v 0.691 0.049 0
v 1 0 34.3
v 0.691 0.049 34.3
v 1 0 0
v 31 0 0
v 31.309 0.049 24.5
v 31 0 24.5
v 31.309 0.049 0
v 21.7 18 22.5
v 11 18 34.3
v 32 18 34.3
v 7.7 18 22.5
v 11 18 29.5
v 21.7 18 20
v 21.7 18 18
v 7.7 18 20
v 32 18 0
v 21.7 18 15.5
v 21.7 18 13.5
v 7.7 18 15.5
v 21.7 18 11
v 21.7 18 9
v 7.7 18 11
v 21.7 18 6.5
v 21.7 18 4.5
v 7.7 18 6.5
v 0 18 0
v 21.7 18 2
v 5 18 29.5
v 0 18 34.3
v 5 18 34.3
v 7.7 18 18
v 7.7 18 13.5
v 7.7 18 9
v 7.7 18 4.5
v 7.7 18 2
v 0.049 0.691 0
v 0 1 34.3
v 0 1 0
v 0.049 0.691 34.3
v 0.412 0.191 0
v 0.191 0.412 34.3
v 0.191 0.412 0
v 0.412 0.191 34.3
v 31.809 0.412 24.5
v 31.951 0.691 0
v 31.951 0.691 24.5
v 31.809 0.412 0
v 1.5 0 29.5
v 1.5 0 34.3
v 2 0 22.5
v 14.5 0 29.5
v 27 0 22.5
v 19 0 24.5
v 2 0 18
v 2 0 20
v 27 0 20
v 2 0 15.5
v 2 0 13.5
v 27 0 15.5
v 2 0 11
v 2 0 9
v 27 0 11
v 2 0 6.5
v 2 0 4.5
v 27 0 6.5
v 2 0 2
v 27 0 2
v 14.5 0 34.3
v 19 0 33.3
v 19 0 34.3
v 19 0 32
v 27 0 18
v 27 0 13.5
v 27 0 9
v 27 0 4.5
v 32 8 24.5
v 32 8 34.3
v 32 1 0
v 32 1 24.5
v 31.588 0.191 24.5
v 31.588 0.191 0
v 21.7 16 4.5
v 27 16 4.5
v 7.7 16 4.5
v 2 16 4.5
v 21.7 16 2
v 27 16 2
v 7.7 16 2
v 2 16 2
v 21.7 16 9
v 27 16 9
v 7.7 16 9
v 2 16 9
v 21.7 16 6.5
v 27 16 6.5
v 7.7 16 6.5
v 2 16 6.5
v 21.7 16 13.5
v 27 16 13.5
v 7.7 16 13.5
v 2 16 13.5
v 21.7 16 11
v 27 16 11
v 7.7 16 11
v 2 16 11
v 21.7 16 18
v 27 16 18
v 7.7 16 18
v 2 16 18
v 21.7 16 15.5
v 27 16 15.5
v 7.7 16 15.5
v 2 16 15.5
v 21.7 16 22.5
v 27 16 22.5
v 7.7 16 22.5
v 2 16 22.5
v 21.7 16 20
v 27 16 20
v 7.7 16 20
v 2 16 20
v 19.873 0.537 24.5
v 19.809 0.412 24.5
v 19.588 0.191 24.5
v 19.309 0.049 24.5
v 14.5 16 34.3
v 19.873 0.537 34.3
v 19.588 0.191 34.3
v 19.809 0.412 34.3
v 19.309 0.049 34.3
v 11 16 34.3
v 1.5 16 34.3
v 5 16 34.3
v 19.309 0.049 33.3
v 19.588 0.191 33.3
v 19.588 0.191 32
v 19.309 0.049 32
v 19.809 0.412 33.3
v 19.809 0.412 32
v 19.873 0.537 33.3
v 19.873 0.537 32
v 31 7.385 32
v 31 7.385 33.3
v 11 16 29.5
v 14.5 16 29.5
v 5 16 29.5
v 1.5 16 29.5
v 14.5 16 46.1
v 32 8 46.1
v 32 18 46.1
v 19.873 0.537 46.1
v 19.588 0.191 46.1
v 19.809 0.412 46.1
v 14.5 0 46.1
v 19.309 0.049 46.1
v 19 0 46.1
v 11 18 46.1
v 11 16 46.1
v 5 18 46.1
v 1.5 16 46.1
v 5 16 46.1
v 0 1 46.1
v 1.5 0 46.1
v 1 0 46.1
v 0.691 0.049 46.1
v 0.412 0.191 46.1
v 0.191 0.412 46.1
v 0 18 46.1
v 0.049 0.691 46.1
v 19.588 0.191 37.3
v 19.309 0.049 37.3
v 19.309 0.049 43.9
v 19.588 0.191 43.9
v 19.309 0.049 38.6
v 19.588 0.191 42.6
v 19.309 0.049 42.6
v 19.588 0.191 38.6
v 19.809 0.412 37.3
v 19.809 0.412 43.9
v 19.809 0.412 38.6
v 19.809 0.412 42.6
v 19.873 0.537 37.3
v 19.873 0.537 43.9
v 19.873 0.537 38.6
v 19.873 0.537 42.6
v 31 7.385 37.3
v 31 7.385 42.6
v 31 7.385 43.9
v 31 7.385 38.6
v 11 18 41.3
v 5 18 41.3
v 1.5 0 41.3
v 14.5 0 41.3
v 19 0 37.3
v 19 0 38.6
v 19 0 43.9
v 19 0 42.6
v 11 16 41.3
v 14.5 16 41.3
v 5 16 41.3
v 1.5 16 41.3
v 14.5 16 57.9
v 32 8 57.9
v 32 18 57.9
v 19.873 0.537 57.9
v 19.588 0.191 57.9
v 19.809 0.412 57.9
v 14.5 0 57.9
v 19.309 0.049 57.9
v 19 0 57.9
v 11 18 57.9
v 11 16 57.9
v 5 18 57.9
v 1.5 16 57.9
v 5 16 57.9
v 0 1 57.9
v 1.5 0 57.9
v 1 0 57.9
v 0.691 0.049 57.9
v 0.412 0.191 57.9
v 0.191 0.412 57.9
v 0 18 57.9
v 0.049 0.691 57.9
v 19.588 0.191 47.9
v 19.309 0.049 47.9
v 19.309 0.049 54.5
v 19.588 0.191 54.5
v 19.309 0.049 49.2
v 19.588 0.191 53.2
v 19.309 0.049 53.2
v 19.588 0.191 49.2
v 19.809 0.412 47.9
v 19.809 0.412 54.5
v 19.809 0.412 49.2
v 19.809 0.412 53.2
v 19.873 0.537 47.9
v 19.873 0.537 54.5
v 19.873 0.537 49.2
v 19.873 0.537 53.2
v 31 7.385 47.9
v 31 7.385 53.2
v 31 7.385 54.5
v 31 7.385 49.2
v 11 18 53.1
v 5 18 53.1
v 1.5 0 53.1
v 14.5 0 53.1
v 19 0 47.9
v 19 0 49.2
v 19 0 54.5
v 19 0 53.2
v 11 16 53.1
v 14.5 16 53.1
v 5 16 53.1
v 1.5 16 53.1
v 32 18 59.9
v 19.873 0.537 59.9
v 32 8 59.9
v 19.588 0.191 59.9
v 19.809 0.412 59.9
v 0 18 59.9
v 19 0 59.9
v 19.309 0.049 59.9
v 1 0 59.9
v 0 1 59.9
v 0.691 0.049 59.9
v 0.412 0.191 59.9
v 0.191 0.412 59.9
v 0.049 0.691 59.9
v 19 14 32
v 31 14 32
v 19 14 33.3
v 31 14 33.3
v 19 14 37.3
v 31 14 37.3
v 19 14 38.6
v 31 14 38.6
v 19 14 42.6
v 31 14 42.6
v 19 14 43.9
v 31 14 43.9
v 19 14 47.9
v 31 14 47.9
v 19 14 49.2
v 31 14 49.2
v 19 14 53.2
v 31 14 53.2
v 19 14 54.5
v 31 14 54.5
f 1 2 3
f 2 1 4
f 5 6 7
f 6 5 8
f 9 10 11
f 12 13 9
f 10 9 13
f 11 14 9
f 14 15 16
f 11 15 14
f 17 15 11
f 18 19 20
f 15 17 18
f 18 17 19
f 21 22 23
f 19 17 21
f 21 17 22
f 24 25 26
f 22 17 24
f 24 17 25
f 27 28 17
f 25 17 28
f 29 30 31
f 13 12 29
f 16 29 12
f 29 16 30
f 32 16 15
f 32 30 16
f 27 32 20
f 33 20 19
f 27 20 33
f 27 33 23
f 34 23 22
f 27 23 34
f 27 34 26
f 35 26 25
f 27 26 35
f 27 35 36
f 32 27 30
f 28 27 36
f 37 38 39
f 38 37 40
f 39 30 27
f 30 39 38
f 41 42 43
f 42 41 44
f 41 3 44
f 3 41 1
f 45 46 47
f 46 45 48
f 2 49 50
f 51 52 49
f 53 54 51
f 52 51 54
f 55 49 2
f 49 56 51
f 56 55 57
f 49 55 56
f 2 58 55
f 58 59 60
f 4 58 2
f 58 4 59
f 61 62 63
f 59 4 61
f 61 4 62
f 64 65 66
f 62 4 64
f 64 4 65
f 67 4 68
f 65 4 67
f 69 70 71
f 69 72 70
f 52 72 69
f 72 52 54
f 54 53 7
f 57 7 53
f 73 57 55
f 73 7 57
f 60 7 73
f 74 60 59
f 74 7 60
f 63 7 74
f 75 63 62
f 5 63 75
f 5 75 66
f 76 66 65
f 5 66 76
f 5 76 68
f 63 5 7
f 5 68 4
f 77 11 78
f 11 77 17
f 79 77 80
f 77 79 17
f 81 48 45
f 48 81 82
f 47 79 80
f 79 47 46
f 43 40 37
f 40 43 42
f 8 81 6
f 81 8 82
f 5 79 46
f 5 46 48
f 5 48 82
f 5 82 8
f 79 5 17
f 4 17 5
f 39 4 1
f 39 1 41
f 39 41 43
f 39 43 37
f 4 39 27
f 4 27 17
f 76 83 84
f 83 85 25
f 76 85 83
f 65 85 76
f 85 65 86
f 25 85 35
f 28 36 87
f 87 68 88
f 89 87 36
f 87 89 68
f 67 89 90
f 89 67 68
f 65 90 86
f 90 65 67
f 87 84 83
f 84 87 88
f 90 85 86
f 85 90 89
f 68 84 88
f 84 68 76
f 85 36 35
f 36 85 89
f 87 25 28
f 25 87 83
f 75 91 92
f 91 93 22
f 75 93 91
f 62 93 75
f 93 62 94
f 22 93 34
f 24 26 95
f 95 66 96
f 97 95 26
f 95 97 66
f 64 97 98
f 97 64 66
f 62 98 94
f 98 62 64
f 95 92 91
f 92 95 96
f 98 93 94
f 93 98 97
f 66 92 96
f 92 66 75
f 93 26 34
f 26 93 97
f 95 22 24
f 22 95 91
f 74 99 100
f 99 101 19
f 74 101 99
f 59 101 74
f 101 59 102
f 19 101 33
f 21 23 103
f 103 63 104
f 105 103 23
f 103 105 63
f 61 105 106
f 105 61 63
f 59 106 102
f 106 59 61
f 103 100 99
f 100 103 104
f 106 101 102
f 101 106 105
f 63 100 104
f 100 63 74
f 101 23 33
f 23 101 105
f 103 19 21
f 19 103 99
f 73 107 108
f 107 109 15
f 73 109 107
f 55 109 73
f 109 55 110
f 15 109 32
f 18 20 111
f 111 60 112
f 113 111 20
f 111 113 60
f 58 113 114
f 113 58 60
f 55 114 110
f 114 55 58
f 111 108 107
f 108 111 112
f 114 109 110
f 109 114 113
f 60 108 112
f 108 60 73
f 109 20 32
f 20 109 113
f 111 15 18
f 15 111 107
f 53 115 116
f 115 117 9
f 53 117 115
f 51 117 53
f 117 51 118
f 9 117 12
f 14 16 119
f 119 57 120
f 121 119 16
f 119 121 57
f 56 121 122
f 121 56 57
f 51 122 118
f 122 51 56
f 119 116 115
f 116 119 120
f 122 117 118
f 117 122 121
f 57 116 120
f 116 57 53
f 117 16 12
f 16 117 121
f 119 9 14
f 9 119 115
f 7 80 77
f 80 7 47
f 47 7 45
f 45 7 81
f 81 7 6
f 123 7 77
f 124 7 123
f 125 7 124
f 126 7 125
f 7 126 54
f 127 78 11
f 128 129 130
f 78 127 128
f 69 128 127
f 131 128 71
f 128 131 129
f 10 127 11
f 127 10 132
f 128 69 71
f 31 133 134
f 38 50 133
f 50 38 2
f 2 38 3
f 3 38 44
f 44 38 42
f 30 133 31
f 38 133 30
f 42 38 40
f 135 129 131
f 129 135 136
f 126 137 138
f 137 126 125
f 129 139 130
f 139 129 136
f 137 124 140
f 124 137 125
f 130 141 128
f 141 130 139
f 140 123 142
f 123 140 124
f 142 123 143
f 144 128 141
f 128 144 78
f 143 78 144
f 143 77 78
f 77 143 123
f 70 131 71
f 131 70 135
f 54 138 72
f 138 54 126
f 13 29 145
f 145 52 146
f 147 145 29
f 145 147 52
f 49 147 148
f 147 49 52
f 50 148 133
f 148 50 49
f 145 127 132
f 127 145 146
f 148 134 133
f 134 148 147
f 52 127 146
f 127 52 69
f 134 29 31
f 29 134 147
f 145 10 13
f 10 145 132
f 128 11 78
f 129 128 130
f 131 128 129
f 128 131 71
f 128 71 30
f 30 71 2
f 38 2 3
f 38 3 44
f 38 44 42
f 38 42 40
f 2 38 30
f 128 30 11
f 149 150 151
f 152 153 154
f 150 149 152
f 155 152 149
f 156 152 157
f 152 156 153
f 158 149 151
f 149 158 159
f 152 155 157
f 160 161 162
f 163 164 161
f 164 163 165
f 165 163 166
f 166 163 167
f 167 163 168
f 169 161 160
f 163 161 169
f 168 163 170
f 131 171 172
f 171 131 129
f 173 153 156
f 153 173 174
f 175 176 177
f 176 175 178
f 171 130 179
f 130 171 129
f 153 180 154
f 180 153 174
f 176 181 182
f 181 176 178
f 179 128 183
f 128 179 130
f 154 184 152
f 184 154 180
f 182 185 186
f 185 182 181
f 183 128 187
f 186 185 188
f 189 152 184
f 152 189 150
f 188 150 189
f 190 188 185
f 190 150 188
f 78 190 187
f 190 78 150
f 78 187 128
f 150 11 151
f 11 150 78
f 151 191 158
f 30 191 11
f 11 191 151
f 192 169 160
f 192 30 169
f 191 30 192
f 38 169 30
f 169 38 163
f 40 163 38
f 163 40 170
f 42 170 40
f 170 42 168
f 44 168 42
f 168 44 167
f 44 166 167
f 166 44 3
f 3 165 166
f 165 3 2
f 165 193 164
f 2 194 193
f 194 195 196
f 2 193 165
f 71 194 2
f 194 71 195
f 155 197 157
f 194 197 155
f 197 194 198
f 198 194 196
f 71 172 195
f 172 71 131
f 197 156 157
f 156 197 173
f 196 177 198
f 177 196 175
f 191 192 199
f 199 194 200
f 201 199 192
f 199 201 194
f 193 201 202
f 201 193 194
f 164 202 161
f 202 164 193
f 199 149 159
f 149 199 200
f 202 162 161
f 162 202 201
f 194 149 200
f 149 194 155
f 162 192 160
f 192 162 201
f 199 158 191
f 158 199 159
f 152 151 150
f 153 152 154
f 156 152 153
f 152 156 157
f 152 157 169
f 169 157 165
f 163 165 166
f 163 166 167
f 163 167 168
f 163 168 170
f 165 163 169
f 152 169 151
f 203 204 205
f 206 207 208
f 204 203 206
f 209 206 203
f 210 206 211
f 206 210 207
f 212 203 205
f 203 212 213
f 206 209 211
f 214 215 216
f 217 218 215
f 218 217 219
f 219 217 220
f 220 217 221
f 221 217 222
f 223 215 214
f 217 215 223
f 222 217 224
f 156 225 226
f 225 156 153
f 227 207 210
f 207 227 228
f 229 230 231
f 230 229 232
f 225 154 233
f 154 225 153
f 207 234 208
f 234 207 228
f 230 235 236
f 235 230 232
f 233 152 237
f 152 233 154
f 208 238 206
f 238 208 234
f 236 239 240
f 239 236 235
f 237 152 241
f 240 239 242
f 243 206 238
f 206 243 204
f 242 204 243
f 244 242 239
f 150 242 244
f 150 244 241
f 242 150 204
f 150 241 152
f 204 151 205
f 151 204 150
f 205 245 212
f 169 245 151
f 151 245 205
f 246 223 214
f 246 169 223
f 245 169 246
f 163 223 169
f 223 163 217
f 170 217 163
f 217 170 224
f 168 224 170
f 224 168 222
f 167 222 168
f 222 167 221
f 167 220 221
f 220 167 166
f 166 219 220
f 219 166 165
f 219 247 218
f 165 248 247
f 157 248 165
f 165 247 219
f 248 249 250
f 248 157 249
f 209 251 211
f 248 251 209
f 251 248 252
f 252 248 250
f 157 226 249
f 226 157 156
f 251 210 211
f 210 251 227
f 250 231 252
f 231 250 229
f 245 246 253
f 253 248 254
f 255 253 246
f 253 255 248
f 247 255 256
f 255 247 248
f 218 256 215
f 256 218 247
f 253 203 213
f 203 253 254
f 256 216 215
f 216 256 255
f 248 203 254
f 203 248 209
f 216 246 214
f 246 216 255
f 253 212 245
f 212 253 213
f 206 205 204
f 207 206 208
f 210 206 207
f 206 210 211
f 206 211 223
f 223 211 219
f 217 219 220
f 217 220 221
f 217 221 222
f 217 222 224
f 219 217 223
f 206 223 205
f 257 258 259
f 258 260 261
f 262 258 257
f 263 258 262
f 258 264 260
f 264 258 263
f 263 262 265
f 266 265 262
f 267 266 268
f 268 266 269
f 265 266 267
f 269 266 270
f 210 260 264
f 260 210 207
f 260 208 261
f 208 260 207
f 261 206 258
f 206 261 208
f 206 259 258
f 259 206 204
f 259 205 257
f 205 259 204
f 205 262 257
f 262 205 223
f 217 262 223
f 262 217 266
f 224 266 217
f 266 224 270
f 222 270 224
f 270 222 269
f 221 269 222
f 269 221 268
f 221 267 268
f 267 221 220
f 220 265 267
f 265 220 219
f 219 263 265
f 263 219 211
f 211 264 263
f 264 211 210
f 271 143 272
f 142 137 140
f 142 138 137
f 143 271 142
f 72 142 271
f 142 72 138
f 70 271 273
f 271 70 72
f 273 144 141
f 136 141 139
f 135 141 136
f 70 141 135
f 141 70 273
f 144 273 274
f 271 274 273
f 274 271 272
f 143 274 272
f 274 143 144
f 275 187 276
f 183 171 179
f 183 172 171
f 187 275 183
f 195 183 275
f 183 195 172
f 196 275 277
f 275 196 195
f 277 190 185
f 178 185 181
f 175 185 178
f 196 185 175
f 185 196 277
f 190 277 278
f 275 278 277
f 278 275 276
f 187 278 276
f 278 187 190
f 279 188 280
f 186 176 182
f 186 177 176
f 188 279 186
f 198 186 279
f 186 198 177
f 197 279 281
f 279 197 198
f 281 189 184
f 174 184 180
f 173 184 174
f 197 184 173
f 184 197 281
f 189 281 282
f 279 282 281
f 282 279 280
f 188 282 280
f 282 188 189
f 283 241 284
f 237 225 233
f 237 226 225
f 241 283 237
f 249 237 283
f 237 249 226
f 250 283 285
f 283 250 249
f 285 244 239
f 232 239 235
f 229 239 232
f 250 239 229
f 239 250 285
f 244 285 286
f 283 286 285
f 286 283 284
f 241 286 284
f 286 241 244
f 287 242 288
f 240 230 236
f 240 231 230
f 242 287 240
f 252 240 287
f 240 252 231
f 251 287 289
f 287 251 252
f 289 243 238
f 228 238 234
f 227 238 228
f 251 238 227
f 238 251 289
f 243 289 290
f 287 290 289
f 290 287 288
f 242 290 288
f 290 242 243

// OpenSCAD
// 
// (c) g3org 

//Count of SD Slots
    count_SD = 5;
//SD Card thickness
    SD_thickness=2.5;

//Count of SD Slots
    count_USB = 3;
//USB Slot thickness
    USB_thickness =4.8;
//Space between USB Slots
    USB_space = 7;

//Count micro SD 
    count_microSD =5;
//micro SD thickness
    microSD_thickness =1.3;


//Full_Render


/* [Hidden] */
$fn=20;

//inputs end

color("LawnGreen"){  
    SD_Card_render();
        difference() {
            USB_Slot();
            microSD();
        }
}



module microSD(){
    
    
     //micro SD_slot
    for (i = [ 0 : count_microSD-1 ] ) {
    
            translate([19,0,((count_SD*(SD_thickness+2.5))+USB_space)+(i*(microSD_thickness+4))]){
                linear_extrude(height = microSD_thickness, center = false, convexity = 10) {
                square([12,14]);
                }
            }
    }
}
module USB_Slot(){
    
  translate([0,0,count_SD*(SD_thickness+2)]){
   for (i = [ 0-1 : count_USB-2 ] ) {    
       
    translate([0,0,i*(USB_space+USB_thickness) ]){
        echo(i,i*(USB_space+USB_thickness));  
        difference() {
            // Block plus Rundung
            linear_extrude(height = USB_thickness+USB_space, center = false, convexity = 10) {
            translate([19,1,0,])  circle(1);
                translate([1,1,0,])  circle(1);
                polygon([[1,0],[19,0],[32,8],[32,18],[0,18],[0,1]],[[0,1,2,3,4,5]]);
           }
 //USB_slot_Schlitz
            translate([1.5,-3,USB_space]){
                linear_extrude(height = USB_thickness, center = false, convexity = 10) {
                square([13,19]);
                }
            }
  //Bodendurchbruch          
             translate([5,1,USB_space,]){
                linear_extrude(height = USB_thickness, center = false, convexity = 10) {
                square([6,19]);
                }
            } 
        } 
    } 
    i = i+1; 
  } 
  
  //Abschlussplatte_USB_Slots
      translate([0,0,count_USB*(USB_thickness+USB_space)]){
          linear_extrude(height = 2, center = false, convexity = 10) {
                translate([19,1,0,])  circle(1);
                translate([1,1,0,])  circle(1);
                polygon([[1,0],[19,0],[32,8],[32,18],[0,18],[0,1]],[[0,1,2,3,4,5]]);
            }
       } 
    }
}


module SD_Card_render(){
    
  for (i = [ 0 : count_SD-1 ] ) {    
    translate([0,0,i*(SD_thickness+2)-(SD_thickness+2)]){
        difference() {
            // Block plus Rundung
            linear_extrude(height = SD_thickness+2, center = false, convexity = 10) {
                translate([1,0,0,])   square([30,17]);
                translate([0,1,0,])  square([32,17]);
                translate([31,1,0,])  circle(1);
                translate([1,1,0,])  circle(1);
            }
  //SD_slot_Schlitz
            translate([2,-3,2,]){
                linear_extrude(height = SD_thickness, center = false, convexity = 10) {
                square([25,19]);
                }
            }
  //Bodendurchbruch          
            translate([7.7,1,2,]){
                linear_extrude(height = SD_thickness, center = false, convexity = 10) {
                square([14,19]);
                }
            }
        }
    }
    i = i+1;
  }
  //Abschlussplatte_SD_Cars Slots
      translate([0,0,count_SD*(SD_thickness+2)]){
          linear_extrude(height = 2, center = false, convexity = 10) {
                translate([1,0,0,])   square([30,17]);
                translate([0,1,0,])  square([32,17]);
                translate([31,1,0,])  circle(1);
                translate([1,1,0,])  circle(1);
            }
        }
}
